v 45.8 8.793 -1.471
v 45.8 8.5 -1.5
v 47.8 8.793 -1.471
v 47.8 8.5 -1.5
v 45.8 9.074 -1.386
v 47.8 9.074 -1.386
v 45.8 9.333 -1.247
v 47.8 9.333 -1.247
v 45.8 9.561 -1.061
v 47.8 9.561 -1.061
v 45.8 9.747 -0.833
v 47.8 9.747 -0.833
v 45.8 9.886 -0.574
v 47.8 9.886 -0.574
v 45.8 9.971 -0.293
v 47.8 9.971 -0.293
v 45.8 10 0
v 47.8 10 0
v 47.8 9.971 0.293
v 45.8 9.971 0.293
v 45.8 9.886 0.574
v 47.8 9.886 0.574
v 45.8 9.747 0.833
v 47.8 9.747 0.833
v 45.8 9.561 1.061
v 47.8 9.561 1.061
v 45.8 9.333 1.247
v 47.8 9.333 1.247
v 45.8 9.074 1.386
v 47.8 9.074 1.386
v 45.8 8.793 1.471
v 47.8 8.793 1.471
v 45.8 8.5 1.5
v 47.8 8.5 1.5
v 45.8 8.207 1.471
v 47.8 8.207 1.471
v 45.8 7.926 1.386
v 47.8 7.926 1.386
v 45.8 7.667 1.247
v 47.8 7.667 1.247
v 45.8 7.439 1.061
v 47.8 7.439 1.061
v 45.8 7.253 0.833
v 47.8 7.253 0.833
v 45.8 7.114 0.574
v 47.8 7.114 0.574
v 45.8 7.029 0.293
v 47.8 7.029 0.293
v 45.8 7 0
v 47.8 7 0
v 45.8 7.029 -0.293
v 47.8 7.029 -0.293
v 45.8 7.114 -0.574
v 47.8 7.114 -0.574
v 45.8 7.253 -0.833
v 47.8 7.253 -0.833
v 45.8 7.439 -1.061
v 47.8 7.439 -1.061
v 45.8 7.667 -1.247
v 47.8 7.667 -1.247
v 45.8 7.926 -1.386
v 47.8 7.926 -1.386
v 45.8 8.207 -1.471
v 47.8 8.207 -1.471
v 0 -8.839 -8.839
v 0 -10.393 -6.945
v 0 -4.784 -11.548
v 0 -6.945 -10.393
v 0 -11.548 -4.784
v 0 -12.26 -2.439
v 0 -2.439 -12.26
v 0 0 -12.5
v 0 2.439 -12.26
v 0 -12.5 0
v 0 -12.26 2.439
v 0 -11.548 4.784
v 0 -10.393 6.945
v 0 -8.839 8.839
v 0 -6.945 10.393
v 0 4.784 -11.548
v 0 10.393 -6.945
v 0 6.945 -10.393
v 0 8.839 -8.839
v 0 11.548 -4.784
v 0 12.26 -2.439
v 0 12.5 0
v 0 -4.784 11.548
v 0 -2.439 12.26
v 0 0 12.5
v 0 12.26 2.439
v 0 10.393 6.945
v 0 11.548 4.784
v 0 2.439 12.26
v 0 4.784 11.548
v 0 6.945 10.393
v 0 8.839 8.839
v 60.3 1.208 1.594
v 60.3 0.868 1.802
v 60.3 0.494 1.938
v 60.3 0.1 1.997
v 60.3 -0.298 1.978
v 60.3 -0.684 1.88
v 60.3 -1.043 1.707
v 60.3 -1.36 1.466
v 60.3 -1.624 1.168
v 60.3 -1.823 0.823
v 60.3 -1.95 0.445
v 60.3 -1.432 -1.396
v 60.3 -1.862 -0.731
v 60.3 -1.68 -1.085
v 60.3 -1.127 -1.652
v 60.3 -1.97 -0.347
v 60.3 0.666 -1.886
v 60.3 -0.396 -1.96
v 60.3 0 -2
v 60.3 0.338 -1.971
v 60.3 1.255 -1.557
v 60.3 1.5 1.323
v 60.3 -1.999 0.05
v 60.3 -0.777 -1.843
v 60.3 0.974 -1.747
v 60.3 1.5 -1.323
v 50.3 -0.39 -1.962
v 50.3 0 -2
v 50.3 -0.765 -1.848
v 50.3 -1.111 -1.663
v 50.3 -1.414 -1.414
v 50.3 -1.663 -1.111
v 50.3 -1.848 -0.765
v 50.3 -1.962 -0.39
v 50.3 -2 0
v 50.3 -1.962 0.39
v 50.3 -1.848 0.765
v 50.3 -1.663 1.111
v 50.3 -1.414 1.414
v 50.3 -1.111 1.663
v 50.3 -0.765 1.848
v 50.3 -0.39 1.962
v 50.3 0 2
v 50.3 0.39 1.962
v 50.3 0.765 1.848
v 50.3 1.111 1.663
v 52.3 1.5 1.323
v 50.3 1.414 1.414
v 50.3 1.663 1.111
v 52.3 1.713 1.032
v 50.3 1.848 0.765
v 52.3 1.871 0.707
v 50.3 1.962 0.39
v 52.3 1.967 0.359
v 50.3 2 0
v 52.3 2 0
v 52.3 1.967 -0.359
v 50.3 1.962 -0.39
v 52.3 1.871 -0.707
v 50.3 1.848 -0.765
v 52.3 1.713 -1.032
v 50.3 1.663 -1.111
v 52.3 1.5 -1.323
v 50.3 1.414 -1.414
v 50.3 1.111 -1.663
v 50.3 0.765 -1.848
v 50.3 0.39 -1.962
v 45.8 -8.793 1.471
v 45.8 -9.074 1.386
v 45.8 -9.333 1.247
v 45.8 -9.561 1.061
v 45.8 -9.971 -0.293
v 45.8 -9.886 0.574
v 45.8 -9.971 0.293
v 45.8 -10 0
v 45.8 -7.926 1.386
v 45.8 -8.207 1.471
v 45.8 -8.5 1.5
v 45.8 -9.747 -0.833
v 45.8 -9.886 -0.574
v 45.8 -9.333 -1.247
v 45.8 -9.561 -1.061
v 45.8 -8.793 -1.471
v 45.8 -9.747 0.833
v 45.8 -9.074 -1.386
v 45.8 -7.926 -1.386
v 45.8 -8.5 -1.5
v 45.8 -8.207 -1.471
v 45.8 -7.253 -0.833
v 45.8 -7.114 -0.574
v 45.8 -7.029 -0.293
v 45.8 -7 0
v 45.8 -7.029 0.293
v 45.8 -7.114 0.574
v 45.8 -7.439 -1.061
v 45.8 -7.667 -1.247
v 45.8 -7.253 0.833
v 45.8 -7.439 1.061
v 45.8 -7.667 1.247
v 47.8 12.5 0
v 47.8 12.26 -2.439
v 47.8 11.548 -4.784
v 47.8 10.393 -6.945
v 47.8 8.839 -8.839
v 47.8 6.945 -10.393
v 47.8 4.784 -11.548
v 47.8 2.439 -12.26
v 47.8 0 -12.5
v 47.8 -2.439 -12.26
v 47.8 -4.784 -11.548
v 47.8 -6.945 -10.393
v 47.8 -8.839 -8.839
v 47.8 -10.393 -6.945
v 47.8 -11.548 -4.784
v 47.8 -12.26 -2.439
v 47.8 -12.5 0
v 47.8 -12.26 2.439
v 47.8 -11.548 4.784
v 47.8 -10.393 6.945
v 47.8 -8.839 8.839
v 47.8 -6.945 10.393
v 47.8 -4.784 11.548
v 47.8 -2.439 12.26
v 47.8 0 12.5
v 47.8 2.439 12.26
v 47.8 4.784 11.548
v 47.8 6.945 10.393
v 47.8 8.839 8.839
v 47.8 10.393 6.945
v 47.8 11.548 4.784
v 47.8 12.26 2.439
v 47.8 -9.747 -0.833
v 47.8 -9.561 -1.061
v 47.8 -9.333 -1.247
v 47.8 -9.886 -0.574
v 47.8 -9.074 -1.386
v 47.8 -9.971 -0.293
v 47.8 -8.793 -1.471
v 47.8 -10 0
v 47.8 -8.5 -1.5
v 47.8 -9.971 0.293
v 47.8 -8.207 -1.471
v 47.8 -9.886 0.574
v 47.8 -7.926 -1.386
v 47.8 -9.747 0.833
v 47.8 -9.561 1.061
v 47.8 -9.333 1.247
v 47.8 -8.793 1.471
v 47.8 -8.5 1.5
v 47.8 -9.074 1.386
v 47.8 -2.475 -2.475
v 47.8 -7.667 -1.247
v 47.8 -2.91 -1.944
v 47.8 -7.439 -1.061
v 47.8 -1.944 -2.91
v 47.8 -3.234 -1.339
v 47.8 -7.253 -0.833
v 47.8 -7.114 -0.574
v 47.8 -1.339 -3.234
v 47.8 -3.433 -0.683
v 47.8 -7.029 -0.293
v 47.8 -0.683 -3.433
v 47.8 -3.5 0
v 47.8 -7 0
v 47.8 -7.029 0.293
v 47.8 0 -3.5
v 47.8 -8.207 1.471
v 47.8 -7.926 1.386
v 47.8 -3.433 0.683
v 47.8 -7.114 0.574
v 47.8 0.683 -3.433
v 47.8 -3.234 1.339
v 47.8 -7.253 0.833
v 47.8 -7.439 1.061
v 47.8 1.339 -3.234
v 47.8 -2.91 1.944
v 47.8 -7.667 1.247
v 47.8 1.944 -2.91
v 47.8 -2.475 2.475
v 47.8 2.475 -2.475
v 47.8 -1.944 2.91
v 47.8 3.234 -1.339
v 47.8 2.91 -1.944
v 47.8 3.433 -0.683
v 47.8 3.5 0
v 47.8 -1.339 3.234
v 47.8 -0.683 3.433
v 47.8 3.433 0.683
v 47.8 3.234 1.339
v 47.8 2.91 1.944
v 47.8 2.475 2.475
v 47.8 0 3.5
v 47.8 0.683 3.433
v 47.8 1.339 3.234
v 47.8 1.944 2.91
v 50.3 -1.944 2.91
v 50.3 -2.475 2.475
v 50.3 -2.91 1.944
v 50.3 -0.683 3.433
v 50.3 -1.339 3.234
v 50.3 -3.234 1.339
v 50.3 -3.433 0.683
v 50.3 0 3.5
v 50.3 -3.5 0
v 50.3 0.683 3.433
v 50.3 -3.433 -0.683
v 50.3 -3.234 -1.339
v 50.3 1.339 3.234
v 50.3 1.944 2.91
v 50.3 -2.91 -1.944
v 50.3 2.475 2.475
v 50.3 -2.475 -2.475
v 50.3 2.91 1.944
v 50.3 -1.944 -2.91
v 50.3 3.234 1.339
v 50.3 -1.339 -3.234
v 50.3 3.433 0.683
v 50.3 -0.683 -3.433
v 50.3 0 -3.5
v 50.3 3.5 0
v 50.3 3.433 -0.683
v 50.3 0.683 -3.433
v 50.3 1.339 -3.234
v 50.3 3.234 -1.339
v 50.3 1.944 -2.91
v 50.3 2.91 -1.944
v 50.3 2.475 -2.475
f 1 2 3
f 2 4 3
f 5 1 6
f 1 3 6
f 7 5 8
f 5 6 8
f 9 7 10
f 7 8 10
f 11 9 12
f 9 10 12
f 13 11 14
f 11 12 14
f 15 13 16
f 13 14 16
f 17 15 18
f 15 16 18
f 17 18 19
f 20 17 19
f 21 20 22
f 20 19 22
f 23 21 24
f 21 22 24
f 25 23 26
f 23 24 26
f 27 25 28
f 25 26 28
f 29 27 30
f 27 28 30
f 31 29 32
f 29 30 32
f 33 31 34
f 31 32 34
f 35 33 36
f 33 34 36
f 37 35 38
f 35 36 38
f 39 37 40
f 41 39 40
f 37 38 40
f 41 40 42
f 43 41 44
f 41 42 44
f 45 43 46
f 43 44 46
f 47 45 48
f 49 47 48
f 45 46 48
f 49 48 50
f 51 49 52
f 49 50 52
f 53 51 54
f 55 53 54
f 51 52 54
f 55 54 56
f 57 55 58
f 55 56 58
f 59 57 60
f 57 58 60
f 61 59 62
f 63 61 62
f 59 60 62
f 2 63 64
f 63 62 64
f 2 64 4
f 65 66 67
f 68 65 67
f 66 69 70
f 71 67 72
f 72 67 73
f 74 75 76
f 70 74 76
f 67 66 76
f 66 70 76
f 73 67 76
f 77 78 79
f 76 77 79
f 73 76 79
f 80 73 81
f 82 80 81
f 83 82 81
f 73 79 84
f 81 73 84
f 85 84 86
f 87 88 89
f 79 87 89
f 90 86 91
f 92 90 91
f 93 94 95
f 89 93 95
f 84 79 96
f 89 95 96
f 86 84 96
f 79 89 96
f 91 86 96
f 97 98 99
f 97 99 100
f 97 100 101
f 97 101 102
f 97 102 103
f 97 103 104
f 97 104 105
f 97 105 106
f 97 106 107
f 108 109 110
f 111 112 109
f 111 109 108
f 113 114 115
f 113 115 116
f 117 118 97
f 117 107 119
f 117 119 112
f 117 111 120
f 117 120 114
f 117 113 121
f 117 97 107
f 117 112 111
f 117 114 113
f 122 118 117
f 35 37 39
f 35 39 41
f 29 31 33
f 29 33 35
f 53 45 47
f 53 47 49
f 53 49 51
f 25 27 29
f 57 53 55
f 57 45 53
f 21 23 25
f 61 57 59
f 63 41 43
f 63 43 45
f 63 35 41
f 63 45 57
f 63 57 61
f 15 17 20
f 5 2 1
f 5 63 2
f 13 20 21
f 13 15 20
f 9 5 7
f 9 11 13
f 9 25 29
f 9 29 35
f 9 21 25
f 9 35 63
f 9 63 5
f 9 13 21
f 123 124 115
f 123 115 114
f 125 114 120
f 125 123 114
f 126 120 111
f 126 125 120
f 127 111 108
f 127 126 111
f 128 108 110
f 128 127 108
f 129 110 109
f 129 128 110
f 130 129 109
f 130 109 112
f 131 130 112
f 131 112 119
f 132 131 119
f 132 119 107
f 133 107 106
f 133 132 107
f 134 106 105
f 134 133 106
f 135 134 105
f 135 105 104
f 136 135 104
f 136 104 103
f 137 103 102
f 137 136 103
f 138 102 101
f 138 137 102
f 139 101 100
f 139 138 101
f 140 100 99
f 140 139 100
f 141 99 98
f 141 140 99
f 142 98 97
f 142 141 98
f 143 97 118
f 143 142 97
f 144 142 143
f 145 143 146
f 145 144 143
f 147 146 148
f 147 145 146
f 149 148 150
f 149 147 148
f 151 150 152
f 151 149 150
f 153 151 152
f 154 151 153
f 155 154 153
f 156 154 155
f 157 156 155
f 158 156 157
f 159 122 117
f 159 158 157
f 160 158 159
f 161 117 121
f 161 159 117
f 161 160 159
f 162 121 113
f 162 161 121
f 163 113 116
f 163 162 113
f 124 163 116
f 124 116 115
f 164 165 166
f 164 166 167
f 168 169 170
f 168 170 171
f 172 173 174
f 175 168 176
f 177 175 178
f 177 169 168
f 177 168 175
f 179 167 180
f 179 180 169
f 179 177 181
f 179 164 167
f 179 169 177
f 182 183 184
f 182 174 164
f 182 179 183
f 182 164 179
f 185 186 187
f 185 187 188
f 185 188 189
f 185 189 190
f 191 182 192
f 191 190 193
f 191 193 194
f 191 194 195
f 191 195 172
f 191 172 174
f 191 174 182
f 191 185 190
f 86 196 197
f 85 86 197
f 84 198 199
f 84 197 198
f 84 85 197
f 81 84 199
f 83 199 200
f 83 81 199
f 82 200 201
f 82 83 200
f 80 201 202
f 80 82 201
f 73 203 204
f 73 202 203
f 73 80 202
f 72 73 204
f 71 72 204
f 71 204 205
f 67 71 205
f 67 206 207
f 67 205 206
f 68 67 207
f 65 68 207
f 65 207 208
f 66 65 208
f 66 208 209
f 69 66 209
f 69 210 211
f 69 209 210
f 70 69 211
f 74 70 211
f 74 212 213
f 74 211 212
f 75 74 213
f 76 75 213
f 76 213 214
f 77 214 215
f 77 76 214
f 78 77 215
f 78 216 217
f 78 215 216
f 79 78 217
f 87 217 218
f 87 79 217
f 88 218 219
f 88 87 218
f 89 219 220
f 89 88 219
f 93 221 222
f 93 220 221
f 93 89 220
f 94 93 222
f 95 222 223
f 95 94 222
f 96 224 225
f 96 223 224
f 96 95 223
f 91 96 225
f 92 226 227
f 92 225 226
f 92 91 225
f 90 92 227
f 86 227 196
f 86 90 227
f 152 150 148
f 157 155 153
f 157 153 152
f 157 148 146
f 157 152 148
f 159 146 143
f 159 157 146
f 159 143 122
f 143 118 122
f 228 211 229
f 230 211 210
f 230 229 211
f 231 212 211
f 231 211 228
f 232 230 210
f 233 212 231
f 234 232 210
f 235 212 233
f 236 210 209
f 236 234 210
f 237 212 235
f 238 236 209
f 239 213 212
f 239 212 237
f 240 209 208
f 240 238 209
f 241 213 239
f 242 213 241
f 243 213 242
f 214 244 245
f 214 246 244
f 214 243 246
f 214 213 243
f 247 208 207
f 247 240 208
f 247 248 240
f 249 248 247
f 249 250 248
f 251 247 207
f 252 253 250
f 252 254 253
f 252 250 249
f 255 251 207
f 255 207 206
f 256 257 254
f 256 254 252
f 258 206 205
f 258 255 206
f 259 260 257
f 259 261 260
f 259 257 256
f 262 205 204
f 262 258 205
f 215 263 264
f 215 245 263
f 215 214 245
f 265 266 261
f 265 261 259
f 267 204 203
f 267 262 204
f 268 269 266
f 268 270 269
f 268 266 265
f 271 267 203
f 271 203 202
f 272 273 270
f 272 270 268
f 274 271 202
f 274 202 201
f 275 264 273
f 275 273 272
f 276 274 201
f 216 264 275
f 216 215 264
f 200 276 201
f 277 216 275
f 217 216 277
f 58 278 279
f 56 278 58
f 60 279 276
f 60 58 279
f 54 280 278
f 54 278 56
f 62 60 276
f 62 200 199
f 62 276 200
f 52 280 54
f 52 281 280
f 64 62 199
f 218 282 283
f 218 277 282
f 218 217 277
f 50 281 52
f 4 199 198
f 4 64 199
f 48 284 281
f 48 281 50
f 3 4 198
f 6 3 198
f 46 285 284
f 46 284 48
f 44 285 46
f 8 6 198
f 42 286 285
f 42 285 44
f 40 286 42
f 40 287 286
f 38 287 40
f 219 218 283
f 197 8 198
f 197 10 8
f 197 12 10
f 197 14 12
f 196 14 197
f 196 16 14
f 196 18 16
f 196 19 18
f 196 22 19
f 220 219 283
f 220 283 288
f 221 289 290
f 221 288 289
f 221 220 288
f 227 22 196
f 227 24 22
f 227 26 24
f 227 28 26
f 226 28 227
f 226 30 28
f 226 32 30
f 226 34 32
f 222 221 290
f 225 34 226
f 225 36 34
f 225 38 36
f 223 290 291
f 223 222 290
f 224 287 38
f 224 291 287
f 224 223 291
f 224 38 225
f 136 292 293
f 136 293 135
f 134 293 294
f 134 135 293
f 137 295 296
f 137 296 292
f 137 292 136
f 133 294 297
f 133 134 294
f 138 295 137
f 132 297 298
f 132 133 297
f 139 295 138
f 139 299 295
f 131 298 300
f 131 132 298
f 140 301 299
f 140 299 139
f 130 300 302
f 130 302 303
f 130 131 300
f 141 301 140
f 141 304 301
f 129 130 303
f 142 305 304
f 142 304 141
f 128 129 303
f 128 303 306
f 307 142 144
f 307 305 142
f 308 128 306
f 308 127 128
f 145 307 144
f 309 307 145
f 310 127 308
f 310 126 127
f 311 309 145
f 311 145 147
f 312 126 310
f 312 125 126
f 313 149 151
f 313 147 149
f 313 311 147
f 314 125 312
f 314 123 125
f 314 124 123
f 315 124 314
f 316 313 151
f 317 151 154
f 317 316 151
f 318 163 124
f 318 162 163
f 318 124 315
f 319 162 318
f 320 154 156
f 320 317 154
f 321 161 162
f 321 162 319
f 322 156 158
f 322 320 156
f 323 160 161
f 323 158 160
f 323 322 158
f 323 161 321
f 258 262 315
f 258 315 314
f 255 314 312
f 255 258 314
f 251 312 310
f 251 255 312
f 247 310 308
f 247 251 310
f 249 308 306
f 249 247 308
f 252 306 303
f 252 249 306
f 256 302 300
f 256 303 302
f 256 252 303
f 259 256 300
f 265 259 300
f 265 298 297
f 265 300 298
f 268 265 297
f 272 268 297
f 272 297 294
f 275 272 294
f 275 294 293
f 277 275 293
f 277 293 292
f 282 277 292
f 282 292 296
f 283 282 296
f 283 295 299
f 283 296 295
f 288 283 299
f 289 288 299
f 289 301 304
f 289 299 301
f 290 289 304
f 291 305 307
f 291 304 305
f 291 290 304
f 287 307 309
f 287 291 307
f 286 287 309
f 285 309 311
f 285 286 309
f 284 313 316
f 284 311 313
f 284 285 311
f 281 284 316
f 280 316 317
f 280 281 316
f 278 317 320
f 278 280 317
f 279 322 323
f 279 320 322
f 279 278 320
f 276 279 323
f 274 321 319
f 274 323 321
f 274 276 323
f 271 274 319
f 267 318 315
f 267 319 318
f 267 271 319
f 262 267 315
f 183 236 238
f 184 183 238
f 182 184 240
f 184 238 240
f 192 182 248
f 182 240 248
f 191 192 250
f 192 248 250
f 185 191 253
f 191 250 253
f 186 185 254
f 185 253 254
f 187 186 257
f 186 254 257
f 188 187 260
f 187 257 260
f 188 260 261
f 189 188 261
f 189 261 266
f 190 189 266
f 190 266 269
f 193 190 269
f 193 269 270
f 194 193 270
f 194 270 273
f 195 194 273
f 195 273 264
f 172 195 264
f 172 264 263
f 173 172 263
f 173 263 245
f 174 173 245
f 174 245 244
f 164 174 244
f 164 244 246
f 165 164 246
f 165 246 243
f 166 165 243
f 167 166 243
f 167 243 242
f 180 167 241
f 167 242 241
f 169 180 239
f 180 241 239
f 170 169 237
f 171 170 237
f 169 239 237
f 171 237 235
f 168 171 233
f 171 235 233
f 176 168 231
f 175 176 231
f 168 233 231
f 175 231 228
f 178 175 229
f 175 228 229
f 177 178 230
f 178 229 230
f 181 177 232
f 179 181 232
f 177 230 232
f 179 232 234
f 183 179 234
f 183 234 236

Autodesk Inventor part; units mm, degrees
ref_plane "YZ Plane" through (0, 0, 0) normal (1, 0, 0) x (0, 1, 0)
ref_plane "XZ Plane" through (0, 0, 0) normal (0, 1, 0) x (-1, 0, 0)
ref_plane "XY Plane" through (0, 0, 0) normal (0, 0, 1) x (1, 0, 0)
sketch "Sketch1" plane through (0, 0, 0) normal (1, 0, 0) x (0, 1, 0)
  circle A0 centre (0, 0) radius 12.5
  dimension "d0" = 25
extrude "Extrusion1" add sketch "Sketch1" along normal blind 47.8
sketch "Sketch2" plane through (47.8, 0, 0) normal (1, 0, 0) x (0, 0, -1)
  circle A0 centre (0, -8.5) radius 1.5
  circle A1 centre (0, 8.5) radius 1.5
  circle A2 centre (0, 0) radius 3.5
  dimension "d4" = 3
  dimension "d5" = 7
extrude "Extrusion2" add sketch "Sketch2" along normal blind 2.5 contours A2
extrude "Extrusion3" cut sketch "Sketch2" against normal blind 2 contours A0 | A1
sketch "Sketch3" plane through (50.3, 0, 0) normal (1, 0, 0) x (0, 0, -1)
  circle A0 centre (0, 0) radius 2
  dimension "d10" = 4
extrude "Extrusion4" add sketch "Sketch3" along normal blind 10
sketch "Sketch4" plane through (60.3, 0, 0) normal (1, 0, 0) x (0, 0, -1)
  circle A0 centre (0, 0) radius 2 projected
  line L0 (0, -2) -> (0, 1.5)
  line L1 (0, 1.5) -> (1.3229, 1.5)
  line L2 (-1.3229, 1.5) -> (0, 1.5)
  arc A1 (1.3229, 1.5) -> (-1.3229, 1.5) centre (0, 0) ccw
  dimension "d13" = 3.5
extrude "Extrusion5" cut sketch "Sketch4" against normal blind 8 contours L1 L2 A0
properties part number "small motor"
